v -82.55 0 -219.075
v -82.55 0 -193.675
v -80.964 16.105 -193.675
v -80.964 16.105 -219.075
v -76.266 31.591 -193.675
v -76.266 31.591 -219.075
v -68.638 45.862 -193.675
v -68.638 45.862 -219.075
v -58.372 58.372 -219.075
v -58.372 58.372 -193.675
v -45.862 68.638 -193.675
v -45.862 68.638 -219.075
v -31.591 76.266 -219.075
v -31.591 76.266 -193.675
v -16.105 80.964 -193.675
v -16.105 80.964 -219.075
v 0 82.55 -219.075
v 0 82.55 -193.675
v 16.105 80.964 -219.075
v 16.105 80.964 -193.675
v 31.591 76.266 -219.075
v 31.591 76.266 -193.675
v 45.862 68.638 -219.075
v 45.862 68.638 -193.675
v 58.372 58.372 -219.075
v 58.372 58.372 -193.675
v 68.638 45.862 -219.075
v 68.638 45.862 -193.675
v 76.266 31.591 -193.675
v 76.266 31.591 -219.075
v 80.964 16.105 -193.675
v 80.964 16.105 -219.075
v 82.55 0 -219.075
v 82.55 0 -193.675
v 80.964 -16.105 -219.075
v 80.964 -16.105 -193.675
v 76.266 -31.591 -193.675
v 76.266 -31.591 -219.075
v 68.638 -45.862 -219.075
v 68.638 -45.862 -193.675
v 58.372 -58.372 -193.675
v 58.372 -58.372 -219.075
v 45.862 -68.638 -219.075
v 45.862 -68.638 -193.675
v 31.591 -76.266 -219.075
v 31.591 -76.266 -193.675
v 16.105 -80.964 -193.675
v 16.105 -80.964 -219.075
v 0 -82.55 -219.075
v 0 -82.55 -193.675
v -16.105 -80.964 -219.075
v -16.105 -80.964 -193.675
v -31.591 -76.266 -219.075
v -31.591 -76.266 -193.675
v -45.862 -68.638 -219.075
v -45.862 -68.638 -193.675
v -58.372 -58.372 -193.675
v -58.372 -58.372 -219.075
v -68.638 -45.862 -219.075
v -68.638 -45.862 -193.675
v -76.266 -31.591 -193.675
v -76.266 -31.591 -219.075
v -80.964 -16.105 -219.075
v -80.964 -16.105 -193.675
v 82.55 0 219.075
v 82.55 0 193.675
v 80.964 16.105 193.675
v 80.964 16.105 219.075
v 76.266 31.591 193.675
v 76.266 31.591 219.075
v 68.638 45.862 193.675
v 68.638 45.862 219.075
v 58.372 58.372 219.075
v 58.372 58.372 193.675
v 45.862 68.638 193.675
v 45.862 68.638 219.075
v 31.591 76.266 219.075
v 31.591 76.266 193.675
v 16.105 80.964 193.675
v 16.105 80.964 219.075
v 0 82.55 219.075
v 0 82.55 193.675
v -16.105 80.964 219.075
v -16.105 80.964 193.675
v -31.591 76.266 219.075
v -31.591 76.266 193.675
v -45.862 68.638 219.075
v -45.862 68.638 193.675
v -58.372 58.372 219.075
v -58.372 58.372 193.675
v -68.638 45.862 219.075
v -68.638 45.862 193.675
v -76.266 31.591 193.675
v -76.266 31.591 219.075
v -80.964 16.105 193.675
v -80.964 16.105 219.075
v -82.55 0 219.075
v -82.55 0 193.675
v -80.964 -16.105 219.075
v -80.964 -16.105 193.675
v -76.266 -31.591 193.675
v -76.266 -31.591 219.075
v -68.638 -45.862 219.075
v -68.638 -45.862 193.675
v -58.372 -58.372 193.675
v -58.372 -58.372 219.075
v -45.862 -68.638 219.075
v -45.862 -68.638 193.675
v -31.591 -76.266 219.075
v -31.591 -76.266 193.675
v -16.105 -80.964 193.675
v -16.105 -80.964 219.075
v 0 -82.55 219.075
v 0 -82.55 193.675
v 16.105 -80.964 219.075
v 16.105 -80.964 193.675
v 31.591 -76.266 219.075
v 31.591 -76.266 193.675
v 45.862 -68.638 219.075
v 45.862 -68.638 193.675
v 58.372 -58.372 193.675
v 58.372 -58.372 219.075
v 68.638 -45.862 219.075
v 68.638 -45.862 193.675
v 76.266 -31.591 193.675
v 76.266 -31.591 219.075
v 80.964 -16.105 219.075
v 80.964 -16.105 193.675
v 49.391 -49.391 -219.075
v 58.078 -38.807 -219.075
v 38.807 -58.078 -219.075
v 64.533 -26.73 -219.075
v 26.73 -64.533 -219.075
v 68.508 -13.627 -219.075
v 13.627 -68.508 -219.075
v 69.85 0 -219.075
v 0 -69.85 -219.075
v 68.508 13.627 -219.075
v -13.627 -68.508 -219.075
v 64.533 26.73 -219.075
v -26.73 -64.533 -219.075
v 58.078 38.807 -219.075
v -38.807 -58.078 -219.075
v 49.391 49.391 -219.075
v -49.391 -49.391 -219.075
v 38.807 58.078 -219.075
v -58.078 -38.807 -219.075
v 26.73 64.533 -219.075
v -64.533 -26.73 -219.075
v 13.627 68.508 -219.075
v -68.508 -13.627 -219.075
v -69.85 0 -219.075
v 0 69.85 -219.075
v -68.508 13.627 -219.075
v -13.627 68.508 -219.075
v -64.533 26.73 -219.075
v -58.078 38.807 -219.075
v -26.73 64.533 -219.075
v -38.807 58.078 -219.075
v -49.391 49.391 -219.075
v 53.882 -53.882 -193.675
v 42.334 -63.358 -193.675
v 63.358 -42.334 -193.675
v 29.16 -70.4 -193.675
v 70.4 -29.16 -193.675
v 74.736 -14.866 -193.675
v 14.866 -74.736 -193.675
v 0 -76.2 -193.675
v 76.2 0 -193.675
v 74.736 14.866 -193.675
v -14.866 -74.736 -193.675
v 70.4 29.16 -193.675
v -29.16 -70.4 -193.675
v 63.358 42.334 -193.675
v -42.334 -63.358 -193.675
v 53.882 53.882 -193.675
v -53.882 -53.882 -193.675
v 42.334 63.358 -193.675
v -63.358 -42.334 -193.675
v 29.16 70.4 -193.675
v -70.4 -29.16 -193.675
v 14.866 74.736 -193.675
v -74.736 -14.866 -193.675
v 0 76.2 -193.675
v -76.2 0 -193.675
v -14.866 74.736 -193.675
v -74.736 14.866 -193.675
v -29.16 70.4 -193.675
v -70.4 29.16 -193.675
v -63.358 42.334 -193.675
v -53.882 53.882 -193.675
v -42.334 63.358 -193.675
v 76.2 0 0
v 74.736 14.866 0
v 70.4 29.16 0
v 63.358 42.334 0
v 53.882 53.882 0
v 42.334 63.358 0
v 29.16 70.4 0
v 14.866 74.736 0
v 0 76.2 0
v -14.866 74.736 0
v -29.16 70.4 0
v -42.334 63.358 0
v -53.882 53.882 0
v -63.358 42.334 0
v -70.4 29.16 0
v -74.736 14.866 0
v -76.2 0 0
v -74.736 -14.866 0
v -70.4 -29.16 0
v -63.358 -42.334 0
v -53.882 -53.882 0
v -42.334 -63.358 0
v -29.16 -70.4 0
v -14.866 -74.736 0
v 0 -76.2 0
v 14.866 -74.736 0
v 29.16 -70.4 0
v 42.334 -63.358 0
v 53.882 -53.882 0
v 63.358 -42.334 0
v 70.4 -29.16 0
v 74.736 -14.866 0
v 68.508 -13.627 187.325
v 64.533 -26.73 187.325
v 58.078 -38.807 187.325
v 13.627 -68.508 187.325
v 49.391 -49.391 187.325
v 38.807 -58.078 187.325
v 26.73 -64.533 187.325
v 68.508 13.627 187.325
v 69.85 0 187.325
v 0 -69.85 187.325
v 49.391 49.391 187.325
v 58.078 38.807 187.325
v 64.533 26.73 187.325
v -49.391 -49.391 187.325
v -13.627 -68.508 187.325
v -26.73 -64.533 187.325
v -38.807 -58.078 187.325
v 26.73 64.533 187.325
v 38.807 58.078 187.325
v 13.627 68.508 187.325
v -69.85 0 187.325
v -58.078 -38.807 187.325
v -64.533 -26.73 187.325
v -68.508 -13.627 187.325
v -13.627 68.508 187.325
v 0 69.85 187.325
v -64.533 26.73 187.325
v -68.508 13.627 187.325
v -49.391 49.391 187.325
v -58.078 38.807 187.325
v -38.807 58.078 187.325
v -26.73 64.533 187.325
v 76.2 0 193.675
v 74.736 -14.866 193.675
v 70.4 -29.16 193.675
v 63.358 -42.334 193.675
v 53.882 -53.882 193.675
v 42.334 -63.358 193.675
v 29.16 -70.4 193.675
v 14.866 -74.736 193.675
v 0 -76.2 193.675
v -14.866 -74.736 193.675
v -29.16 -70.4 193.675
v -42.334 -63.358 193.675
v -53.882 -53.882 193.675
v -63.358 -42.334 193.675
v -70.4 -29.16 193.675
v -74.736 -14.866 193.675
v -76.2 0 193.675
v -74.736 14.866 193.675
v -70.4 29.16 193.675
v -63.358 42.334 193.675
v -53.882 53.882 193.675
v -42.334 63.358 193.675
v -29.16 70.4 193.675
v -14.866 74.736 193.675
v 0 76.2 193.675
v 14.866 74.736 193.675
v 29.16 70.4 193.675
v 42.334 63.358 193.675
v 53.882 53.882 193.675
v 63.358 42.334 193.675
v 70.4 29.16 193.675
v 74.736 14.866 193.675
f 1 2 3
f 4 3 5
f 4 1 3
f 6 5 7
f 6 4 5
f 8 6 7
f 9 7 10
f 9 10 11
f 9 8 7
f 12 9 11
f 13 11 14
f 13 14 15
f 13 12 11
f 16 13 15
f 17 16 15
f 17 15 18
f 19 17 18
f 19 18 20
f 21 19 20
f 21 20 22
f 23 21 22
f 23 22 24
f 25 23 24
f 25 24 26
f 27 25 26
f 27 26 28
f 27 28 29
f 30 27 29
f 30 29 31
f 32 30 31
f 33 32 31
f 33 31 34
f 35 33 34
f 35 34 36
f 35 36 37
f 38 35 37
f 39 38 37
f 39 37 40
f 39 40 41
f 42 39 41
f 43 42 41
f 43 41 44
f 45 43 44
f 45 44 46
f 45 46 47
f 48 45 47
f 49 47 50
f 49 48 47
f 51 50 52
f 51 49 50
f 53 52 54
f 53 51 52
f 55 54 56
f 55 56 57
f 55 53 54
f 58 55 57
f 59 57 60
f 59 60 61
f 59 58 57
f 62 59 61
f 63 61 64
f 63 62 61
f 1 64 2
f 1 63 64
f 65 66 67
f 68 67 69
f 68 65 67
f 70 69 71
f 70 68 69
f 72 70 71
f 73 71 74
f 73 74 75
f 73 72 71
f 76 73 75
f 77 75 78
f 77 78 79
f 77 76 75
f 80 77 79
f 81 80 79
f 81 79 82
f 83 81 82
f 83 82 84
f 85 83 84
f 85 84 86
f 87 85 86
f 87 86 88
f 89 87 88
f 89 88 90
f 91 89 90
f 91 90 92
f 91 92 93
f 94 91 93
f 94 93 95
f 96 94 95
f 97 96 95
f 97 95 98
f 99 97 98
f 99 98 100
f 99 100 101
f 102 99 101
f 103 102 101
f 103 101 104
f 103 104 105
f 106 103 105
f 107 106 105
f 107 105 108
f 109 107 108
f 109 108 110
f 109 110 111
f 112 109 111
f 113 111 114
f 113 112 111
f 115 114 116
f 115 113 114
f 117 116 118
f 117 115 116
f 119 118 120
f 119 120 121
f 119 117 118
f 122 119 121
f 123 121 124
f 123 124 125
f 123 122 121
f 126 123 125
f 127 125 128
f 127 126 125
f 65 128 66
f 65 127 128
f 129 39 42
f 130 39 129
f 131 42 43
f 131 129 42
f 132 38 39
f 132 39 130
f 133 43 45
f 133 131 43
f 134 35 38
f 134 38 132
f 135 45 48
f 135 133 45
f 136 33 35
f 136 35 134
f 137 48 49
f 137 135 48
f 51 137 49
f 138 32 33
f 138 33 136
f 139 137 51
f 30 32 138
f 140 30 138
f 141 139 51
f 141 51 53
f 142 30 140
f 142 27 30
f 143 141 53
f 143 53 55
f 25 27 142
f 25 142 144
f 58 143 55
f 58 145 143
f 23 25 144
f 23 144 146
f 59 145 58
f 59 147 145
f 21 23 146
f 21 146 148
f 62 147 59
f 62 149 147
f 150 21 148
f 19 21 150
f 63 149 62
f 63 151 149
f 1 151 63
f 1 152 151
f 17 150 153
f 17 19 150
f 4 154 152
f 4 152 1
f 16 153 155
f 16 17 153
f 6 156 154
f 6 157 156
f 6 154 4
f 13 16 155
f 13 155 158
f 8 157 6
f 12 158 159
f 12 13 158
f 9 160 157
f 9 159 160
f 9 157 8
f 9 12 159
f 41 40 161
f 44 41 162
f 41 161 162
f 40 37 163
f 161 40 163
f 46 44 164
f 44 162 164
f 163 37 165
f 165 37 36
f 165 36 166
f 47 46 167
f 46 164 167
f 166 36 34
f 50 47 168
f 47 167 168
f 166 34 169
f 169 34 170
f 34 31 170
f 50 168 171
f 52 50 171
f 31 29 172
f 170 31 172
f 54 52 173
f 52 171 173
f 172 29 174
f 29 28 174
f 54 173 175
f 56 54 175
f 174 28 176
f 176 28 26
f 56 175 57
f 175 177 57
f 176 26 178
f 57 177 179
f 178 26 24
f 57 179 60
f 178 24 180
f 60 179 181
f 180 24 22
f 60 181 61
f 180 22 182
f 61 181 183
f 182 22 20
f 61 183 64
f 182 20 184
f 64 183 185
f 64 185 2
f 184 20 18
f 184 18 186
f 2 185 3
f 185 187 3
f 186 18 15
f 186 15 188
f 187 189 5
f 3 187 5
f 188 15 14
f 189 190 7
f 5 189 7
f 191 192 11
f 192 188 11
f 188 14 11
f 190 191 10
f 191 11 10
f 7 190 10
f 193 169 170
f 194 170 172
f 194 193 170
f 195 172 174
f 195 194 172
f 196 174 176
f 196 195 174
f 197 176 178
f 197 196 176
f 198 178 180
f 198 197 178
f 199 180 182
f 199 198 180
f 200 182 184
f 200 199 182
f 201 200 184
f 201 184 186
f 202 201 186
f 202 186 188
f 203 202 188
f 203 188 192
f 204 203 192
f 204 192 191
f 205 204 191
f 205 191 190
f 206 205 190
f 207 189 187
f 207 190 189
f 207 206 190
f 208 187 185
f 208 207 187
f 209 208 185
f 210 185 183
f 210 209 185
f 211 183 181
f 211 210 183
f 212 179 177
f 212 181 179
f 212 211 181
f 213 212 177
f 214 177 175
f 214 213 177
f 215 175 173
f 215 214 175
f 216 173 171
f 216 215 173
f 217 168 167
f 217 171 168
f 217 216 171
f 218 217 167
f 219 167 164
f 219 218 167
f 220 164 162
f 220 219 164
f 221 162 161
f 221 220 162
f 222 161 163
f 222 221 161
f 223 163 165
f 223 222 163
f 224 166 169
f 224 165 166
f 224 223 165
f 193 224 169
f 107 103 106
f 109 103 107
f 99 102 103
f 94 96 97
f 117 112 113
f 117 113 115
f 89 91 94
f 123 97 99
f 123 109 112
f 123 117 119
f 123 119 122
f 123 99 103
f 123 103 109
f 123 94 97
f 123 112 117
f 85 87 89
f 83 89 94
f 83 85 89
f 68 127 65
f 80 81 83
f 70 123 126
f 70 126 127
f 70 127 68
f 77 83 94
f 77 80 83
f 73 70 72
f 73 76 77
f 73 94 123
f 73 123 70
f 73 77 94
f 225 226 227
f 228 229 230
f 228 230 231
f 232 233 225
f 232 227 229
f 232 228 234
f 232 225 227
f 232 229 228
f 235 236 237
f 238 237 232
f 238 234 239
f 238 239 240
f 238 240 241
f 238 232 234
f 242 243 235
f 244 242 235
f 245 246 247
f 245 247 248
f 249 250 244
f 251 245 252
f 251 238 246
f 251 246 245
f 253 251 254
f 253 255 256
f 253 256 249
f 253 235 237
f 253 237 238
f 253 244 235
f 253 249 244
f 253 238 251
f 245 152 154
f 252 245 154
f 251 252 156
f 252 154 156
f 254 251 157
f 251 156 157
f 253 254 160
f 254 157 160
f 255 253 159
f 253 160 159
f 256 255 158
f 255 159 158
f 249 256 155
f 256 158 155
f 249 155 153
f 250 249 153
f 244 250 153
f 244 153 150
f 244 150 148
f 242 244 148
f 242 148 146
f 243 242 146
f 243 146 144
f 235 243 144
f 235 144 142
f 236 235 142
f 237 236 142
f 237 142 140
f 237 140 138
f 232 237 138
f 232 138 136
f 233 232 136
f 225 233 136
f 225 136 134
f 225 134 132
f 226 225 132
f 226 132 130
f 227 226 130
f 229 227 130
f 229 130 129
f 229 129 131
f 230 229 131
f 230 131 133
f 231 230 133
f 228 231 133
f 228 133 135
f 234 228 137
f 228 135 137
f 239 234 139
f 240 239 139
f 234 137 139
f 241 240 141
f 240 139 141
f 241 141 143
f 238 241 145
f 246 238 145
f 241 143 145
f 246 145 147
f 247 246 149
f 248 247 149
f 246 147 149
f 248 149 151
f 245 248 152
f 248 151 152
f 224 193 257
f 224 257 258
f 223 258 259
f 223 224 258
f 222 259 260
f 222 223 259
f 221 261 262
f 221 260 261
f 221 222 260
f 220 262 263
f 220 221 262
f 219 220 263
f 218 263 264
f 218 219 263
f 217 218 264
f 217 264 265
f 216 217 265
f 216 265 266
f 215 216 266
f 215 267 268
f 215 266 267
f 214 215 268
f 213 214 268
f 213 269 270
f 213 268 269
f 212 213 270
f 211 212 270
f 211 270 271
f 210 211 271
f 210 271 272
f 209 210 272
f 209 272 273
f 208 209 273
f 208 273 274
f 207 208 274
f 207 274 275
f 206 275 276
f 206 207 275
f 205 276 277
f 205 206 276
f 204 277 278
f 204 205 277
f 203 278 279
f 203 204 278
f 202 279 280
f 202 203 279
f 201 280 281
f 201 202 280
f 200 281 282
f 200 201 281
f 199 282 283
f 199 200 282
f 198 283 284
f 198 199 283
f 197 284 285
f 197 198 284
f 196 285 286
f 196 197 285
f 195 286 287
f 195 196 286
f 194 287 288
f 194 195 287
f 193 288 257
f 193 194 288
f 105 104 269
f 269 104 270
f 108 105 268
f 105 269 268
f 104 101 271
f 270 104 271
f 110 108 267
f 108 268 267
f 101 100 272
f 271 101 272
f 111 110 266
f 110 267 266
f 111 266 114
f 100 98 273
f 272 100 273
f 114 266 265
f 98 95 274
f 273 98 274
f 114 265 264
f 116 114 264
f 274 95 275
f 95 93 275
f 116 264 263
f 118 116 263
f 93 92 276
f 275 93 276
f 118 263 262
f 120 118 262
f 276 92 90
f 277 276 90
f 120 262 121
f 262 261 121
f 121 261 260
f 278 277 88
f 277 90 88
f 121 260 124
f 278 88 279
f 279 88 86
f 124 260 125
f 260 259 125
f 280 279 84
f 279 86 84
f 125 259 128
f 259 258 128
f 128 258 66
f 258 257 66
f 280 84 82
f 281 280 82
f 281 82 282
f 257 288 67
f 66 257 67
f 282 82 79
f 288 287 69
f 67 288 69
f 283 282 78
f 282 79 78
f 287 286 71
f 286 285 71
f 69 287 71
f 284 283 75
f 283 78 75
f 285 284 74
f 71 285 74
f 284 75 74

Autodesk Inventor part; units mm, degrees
ref_plane "XZ Plane" through (0, 0, 0) normal (0, 1, 0) x (-1, 0, 0)
ref_plane "XY Plane" through (0, 0, 0) normal (0, 0, 1) x (1, 0, 0)
sketch "Sketch1" plane through (0, 0, 0) normal (0, 0, 1) x (1, 0, 0)
  circle A0 centre (0, 0) radius 76.2
  dimension "tubeDiameter" = 152.4
extrude "Extrusion1" add sketch "Sketch1" along normal mid plane 438.15
sketch "Sketch2" plane through (0, 0, -219.075) normal (0, 0, -1) x (-1, 0, 0)
  circle A0 centre (0, 0) radius 69.85
  dimension "d6" = 139.7
extrude "Extrusion2" cut sketch "Sketch2" against normal blind 406.4
sketch "Sketch3" plane through (0, 0, 219.075) normal (0, 0, 1) x (1, 0, 0)
  circle A0 centre (0, 0) radius 82.55
  circle A1 centre (0, 0) radius 76.2
  dimension "d9" = 165.1
extrude "Extrusion3" add sketch "Sketch3" against normal blind 25.4
sketch "Sketch4" plane through (0, 0, -219.075) normal (0, 0, -1) x (-1, 0, 0)
  circle A0 centre (0, 0) radius 76.2
  circle A1 centre (0, 0) radius 82.55
extrude "Extrusion4" add sketch "Sketch4" against normal blind 25.4
properties part number "telescopeTube" material "Nylon, molybdenum disulphide"
